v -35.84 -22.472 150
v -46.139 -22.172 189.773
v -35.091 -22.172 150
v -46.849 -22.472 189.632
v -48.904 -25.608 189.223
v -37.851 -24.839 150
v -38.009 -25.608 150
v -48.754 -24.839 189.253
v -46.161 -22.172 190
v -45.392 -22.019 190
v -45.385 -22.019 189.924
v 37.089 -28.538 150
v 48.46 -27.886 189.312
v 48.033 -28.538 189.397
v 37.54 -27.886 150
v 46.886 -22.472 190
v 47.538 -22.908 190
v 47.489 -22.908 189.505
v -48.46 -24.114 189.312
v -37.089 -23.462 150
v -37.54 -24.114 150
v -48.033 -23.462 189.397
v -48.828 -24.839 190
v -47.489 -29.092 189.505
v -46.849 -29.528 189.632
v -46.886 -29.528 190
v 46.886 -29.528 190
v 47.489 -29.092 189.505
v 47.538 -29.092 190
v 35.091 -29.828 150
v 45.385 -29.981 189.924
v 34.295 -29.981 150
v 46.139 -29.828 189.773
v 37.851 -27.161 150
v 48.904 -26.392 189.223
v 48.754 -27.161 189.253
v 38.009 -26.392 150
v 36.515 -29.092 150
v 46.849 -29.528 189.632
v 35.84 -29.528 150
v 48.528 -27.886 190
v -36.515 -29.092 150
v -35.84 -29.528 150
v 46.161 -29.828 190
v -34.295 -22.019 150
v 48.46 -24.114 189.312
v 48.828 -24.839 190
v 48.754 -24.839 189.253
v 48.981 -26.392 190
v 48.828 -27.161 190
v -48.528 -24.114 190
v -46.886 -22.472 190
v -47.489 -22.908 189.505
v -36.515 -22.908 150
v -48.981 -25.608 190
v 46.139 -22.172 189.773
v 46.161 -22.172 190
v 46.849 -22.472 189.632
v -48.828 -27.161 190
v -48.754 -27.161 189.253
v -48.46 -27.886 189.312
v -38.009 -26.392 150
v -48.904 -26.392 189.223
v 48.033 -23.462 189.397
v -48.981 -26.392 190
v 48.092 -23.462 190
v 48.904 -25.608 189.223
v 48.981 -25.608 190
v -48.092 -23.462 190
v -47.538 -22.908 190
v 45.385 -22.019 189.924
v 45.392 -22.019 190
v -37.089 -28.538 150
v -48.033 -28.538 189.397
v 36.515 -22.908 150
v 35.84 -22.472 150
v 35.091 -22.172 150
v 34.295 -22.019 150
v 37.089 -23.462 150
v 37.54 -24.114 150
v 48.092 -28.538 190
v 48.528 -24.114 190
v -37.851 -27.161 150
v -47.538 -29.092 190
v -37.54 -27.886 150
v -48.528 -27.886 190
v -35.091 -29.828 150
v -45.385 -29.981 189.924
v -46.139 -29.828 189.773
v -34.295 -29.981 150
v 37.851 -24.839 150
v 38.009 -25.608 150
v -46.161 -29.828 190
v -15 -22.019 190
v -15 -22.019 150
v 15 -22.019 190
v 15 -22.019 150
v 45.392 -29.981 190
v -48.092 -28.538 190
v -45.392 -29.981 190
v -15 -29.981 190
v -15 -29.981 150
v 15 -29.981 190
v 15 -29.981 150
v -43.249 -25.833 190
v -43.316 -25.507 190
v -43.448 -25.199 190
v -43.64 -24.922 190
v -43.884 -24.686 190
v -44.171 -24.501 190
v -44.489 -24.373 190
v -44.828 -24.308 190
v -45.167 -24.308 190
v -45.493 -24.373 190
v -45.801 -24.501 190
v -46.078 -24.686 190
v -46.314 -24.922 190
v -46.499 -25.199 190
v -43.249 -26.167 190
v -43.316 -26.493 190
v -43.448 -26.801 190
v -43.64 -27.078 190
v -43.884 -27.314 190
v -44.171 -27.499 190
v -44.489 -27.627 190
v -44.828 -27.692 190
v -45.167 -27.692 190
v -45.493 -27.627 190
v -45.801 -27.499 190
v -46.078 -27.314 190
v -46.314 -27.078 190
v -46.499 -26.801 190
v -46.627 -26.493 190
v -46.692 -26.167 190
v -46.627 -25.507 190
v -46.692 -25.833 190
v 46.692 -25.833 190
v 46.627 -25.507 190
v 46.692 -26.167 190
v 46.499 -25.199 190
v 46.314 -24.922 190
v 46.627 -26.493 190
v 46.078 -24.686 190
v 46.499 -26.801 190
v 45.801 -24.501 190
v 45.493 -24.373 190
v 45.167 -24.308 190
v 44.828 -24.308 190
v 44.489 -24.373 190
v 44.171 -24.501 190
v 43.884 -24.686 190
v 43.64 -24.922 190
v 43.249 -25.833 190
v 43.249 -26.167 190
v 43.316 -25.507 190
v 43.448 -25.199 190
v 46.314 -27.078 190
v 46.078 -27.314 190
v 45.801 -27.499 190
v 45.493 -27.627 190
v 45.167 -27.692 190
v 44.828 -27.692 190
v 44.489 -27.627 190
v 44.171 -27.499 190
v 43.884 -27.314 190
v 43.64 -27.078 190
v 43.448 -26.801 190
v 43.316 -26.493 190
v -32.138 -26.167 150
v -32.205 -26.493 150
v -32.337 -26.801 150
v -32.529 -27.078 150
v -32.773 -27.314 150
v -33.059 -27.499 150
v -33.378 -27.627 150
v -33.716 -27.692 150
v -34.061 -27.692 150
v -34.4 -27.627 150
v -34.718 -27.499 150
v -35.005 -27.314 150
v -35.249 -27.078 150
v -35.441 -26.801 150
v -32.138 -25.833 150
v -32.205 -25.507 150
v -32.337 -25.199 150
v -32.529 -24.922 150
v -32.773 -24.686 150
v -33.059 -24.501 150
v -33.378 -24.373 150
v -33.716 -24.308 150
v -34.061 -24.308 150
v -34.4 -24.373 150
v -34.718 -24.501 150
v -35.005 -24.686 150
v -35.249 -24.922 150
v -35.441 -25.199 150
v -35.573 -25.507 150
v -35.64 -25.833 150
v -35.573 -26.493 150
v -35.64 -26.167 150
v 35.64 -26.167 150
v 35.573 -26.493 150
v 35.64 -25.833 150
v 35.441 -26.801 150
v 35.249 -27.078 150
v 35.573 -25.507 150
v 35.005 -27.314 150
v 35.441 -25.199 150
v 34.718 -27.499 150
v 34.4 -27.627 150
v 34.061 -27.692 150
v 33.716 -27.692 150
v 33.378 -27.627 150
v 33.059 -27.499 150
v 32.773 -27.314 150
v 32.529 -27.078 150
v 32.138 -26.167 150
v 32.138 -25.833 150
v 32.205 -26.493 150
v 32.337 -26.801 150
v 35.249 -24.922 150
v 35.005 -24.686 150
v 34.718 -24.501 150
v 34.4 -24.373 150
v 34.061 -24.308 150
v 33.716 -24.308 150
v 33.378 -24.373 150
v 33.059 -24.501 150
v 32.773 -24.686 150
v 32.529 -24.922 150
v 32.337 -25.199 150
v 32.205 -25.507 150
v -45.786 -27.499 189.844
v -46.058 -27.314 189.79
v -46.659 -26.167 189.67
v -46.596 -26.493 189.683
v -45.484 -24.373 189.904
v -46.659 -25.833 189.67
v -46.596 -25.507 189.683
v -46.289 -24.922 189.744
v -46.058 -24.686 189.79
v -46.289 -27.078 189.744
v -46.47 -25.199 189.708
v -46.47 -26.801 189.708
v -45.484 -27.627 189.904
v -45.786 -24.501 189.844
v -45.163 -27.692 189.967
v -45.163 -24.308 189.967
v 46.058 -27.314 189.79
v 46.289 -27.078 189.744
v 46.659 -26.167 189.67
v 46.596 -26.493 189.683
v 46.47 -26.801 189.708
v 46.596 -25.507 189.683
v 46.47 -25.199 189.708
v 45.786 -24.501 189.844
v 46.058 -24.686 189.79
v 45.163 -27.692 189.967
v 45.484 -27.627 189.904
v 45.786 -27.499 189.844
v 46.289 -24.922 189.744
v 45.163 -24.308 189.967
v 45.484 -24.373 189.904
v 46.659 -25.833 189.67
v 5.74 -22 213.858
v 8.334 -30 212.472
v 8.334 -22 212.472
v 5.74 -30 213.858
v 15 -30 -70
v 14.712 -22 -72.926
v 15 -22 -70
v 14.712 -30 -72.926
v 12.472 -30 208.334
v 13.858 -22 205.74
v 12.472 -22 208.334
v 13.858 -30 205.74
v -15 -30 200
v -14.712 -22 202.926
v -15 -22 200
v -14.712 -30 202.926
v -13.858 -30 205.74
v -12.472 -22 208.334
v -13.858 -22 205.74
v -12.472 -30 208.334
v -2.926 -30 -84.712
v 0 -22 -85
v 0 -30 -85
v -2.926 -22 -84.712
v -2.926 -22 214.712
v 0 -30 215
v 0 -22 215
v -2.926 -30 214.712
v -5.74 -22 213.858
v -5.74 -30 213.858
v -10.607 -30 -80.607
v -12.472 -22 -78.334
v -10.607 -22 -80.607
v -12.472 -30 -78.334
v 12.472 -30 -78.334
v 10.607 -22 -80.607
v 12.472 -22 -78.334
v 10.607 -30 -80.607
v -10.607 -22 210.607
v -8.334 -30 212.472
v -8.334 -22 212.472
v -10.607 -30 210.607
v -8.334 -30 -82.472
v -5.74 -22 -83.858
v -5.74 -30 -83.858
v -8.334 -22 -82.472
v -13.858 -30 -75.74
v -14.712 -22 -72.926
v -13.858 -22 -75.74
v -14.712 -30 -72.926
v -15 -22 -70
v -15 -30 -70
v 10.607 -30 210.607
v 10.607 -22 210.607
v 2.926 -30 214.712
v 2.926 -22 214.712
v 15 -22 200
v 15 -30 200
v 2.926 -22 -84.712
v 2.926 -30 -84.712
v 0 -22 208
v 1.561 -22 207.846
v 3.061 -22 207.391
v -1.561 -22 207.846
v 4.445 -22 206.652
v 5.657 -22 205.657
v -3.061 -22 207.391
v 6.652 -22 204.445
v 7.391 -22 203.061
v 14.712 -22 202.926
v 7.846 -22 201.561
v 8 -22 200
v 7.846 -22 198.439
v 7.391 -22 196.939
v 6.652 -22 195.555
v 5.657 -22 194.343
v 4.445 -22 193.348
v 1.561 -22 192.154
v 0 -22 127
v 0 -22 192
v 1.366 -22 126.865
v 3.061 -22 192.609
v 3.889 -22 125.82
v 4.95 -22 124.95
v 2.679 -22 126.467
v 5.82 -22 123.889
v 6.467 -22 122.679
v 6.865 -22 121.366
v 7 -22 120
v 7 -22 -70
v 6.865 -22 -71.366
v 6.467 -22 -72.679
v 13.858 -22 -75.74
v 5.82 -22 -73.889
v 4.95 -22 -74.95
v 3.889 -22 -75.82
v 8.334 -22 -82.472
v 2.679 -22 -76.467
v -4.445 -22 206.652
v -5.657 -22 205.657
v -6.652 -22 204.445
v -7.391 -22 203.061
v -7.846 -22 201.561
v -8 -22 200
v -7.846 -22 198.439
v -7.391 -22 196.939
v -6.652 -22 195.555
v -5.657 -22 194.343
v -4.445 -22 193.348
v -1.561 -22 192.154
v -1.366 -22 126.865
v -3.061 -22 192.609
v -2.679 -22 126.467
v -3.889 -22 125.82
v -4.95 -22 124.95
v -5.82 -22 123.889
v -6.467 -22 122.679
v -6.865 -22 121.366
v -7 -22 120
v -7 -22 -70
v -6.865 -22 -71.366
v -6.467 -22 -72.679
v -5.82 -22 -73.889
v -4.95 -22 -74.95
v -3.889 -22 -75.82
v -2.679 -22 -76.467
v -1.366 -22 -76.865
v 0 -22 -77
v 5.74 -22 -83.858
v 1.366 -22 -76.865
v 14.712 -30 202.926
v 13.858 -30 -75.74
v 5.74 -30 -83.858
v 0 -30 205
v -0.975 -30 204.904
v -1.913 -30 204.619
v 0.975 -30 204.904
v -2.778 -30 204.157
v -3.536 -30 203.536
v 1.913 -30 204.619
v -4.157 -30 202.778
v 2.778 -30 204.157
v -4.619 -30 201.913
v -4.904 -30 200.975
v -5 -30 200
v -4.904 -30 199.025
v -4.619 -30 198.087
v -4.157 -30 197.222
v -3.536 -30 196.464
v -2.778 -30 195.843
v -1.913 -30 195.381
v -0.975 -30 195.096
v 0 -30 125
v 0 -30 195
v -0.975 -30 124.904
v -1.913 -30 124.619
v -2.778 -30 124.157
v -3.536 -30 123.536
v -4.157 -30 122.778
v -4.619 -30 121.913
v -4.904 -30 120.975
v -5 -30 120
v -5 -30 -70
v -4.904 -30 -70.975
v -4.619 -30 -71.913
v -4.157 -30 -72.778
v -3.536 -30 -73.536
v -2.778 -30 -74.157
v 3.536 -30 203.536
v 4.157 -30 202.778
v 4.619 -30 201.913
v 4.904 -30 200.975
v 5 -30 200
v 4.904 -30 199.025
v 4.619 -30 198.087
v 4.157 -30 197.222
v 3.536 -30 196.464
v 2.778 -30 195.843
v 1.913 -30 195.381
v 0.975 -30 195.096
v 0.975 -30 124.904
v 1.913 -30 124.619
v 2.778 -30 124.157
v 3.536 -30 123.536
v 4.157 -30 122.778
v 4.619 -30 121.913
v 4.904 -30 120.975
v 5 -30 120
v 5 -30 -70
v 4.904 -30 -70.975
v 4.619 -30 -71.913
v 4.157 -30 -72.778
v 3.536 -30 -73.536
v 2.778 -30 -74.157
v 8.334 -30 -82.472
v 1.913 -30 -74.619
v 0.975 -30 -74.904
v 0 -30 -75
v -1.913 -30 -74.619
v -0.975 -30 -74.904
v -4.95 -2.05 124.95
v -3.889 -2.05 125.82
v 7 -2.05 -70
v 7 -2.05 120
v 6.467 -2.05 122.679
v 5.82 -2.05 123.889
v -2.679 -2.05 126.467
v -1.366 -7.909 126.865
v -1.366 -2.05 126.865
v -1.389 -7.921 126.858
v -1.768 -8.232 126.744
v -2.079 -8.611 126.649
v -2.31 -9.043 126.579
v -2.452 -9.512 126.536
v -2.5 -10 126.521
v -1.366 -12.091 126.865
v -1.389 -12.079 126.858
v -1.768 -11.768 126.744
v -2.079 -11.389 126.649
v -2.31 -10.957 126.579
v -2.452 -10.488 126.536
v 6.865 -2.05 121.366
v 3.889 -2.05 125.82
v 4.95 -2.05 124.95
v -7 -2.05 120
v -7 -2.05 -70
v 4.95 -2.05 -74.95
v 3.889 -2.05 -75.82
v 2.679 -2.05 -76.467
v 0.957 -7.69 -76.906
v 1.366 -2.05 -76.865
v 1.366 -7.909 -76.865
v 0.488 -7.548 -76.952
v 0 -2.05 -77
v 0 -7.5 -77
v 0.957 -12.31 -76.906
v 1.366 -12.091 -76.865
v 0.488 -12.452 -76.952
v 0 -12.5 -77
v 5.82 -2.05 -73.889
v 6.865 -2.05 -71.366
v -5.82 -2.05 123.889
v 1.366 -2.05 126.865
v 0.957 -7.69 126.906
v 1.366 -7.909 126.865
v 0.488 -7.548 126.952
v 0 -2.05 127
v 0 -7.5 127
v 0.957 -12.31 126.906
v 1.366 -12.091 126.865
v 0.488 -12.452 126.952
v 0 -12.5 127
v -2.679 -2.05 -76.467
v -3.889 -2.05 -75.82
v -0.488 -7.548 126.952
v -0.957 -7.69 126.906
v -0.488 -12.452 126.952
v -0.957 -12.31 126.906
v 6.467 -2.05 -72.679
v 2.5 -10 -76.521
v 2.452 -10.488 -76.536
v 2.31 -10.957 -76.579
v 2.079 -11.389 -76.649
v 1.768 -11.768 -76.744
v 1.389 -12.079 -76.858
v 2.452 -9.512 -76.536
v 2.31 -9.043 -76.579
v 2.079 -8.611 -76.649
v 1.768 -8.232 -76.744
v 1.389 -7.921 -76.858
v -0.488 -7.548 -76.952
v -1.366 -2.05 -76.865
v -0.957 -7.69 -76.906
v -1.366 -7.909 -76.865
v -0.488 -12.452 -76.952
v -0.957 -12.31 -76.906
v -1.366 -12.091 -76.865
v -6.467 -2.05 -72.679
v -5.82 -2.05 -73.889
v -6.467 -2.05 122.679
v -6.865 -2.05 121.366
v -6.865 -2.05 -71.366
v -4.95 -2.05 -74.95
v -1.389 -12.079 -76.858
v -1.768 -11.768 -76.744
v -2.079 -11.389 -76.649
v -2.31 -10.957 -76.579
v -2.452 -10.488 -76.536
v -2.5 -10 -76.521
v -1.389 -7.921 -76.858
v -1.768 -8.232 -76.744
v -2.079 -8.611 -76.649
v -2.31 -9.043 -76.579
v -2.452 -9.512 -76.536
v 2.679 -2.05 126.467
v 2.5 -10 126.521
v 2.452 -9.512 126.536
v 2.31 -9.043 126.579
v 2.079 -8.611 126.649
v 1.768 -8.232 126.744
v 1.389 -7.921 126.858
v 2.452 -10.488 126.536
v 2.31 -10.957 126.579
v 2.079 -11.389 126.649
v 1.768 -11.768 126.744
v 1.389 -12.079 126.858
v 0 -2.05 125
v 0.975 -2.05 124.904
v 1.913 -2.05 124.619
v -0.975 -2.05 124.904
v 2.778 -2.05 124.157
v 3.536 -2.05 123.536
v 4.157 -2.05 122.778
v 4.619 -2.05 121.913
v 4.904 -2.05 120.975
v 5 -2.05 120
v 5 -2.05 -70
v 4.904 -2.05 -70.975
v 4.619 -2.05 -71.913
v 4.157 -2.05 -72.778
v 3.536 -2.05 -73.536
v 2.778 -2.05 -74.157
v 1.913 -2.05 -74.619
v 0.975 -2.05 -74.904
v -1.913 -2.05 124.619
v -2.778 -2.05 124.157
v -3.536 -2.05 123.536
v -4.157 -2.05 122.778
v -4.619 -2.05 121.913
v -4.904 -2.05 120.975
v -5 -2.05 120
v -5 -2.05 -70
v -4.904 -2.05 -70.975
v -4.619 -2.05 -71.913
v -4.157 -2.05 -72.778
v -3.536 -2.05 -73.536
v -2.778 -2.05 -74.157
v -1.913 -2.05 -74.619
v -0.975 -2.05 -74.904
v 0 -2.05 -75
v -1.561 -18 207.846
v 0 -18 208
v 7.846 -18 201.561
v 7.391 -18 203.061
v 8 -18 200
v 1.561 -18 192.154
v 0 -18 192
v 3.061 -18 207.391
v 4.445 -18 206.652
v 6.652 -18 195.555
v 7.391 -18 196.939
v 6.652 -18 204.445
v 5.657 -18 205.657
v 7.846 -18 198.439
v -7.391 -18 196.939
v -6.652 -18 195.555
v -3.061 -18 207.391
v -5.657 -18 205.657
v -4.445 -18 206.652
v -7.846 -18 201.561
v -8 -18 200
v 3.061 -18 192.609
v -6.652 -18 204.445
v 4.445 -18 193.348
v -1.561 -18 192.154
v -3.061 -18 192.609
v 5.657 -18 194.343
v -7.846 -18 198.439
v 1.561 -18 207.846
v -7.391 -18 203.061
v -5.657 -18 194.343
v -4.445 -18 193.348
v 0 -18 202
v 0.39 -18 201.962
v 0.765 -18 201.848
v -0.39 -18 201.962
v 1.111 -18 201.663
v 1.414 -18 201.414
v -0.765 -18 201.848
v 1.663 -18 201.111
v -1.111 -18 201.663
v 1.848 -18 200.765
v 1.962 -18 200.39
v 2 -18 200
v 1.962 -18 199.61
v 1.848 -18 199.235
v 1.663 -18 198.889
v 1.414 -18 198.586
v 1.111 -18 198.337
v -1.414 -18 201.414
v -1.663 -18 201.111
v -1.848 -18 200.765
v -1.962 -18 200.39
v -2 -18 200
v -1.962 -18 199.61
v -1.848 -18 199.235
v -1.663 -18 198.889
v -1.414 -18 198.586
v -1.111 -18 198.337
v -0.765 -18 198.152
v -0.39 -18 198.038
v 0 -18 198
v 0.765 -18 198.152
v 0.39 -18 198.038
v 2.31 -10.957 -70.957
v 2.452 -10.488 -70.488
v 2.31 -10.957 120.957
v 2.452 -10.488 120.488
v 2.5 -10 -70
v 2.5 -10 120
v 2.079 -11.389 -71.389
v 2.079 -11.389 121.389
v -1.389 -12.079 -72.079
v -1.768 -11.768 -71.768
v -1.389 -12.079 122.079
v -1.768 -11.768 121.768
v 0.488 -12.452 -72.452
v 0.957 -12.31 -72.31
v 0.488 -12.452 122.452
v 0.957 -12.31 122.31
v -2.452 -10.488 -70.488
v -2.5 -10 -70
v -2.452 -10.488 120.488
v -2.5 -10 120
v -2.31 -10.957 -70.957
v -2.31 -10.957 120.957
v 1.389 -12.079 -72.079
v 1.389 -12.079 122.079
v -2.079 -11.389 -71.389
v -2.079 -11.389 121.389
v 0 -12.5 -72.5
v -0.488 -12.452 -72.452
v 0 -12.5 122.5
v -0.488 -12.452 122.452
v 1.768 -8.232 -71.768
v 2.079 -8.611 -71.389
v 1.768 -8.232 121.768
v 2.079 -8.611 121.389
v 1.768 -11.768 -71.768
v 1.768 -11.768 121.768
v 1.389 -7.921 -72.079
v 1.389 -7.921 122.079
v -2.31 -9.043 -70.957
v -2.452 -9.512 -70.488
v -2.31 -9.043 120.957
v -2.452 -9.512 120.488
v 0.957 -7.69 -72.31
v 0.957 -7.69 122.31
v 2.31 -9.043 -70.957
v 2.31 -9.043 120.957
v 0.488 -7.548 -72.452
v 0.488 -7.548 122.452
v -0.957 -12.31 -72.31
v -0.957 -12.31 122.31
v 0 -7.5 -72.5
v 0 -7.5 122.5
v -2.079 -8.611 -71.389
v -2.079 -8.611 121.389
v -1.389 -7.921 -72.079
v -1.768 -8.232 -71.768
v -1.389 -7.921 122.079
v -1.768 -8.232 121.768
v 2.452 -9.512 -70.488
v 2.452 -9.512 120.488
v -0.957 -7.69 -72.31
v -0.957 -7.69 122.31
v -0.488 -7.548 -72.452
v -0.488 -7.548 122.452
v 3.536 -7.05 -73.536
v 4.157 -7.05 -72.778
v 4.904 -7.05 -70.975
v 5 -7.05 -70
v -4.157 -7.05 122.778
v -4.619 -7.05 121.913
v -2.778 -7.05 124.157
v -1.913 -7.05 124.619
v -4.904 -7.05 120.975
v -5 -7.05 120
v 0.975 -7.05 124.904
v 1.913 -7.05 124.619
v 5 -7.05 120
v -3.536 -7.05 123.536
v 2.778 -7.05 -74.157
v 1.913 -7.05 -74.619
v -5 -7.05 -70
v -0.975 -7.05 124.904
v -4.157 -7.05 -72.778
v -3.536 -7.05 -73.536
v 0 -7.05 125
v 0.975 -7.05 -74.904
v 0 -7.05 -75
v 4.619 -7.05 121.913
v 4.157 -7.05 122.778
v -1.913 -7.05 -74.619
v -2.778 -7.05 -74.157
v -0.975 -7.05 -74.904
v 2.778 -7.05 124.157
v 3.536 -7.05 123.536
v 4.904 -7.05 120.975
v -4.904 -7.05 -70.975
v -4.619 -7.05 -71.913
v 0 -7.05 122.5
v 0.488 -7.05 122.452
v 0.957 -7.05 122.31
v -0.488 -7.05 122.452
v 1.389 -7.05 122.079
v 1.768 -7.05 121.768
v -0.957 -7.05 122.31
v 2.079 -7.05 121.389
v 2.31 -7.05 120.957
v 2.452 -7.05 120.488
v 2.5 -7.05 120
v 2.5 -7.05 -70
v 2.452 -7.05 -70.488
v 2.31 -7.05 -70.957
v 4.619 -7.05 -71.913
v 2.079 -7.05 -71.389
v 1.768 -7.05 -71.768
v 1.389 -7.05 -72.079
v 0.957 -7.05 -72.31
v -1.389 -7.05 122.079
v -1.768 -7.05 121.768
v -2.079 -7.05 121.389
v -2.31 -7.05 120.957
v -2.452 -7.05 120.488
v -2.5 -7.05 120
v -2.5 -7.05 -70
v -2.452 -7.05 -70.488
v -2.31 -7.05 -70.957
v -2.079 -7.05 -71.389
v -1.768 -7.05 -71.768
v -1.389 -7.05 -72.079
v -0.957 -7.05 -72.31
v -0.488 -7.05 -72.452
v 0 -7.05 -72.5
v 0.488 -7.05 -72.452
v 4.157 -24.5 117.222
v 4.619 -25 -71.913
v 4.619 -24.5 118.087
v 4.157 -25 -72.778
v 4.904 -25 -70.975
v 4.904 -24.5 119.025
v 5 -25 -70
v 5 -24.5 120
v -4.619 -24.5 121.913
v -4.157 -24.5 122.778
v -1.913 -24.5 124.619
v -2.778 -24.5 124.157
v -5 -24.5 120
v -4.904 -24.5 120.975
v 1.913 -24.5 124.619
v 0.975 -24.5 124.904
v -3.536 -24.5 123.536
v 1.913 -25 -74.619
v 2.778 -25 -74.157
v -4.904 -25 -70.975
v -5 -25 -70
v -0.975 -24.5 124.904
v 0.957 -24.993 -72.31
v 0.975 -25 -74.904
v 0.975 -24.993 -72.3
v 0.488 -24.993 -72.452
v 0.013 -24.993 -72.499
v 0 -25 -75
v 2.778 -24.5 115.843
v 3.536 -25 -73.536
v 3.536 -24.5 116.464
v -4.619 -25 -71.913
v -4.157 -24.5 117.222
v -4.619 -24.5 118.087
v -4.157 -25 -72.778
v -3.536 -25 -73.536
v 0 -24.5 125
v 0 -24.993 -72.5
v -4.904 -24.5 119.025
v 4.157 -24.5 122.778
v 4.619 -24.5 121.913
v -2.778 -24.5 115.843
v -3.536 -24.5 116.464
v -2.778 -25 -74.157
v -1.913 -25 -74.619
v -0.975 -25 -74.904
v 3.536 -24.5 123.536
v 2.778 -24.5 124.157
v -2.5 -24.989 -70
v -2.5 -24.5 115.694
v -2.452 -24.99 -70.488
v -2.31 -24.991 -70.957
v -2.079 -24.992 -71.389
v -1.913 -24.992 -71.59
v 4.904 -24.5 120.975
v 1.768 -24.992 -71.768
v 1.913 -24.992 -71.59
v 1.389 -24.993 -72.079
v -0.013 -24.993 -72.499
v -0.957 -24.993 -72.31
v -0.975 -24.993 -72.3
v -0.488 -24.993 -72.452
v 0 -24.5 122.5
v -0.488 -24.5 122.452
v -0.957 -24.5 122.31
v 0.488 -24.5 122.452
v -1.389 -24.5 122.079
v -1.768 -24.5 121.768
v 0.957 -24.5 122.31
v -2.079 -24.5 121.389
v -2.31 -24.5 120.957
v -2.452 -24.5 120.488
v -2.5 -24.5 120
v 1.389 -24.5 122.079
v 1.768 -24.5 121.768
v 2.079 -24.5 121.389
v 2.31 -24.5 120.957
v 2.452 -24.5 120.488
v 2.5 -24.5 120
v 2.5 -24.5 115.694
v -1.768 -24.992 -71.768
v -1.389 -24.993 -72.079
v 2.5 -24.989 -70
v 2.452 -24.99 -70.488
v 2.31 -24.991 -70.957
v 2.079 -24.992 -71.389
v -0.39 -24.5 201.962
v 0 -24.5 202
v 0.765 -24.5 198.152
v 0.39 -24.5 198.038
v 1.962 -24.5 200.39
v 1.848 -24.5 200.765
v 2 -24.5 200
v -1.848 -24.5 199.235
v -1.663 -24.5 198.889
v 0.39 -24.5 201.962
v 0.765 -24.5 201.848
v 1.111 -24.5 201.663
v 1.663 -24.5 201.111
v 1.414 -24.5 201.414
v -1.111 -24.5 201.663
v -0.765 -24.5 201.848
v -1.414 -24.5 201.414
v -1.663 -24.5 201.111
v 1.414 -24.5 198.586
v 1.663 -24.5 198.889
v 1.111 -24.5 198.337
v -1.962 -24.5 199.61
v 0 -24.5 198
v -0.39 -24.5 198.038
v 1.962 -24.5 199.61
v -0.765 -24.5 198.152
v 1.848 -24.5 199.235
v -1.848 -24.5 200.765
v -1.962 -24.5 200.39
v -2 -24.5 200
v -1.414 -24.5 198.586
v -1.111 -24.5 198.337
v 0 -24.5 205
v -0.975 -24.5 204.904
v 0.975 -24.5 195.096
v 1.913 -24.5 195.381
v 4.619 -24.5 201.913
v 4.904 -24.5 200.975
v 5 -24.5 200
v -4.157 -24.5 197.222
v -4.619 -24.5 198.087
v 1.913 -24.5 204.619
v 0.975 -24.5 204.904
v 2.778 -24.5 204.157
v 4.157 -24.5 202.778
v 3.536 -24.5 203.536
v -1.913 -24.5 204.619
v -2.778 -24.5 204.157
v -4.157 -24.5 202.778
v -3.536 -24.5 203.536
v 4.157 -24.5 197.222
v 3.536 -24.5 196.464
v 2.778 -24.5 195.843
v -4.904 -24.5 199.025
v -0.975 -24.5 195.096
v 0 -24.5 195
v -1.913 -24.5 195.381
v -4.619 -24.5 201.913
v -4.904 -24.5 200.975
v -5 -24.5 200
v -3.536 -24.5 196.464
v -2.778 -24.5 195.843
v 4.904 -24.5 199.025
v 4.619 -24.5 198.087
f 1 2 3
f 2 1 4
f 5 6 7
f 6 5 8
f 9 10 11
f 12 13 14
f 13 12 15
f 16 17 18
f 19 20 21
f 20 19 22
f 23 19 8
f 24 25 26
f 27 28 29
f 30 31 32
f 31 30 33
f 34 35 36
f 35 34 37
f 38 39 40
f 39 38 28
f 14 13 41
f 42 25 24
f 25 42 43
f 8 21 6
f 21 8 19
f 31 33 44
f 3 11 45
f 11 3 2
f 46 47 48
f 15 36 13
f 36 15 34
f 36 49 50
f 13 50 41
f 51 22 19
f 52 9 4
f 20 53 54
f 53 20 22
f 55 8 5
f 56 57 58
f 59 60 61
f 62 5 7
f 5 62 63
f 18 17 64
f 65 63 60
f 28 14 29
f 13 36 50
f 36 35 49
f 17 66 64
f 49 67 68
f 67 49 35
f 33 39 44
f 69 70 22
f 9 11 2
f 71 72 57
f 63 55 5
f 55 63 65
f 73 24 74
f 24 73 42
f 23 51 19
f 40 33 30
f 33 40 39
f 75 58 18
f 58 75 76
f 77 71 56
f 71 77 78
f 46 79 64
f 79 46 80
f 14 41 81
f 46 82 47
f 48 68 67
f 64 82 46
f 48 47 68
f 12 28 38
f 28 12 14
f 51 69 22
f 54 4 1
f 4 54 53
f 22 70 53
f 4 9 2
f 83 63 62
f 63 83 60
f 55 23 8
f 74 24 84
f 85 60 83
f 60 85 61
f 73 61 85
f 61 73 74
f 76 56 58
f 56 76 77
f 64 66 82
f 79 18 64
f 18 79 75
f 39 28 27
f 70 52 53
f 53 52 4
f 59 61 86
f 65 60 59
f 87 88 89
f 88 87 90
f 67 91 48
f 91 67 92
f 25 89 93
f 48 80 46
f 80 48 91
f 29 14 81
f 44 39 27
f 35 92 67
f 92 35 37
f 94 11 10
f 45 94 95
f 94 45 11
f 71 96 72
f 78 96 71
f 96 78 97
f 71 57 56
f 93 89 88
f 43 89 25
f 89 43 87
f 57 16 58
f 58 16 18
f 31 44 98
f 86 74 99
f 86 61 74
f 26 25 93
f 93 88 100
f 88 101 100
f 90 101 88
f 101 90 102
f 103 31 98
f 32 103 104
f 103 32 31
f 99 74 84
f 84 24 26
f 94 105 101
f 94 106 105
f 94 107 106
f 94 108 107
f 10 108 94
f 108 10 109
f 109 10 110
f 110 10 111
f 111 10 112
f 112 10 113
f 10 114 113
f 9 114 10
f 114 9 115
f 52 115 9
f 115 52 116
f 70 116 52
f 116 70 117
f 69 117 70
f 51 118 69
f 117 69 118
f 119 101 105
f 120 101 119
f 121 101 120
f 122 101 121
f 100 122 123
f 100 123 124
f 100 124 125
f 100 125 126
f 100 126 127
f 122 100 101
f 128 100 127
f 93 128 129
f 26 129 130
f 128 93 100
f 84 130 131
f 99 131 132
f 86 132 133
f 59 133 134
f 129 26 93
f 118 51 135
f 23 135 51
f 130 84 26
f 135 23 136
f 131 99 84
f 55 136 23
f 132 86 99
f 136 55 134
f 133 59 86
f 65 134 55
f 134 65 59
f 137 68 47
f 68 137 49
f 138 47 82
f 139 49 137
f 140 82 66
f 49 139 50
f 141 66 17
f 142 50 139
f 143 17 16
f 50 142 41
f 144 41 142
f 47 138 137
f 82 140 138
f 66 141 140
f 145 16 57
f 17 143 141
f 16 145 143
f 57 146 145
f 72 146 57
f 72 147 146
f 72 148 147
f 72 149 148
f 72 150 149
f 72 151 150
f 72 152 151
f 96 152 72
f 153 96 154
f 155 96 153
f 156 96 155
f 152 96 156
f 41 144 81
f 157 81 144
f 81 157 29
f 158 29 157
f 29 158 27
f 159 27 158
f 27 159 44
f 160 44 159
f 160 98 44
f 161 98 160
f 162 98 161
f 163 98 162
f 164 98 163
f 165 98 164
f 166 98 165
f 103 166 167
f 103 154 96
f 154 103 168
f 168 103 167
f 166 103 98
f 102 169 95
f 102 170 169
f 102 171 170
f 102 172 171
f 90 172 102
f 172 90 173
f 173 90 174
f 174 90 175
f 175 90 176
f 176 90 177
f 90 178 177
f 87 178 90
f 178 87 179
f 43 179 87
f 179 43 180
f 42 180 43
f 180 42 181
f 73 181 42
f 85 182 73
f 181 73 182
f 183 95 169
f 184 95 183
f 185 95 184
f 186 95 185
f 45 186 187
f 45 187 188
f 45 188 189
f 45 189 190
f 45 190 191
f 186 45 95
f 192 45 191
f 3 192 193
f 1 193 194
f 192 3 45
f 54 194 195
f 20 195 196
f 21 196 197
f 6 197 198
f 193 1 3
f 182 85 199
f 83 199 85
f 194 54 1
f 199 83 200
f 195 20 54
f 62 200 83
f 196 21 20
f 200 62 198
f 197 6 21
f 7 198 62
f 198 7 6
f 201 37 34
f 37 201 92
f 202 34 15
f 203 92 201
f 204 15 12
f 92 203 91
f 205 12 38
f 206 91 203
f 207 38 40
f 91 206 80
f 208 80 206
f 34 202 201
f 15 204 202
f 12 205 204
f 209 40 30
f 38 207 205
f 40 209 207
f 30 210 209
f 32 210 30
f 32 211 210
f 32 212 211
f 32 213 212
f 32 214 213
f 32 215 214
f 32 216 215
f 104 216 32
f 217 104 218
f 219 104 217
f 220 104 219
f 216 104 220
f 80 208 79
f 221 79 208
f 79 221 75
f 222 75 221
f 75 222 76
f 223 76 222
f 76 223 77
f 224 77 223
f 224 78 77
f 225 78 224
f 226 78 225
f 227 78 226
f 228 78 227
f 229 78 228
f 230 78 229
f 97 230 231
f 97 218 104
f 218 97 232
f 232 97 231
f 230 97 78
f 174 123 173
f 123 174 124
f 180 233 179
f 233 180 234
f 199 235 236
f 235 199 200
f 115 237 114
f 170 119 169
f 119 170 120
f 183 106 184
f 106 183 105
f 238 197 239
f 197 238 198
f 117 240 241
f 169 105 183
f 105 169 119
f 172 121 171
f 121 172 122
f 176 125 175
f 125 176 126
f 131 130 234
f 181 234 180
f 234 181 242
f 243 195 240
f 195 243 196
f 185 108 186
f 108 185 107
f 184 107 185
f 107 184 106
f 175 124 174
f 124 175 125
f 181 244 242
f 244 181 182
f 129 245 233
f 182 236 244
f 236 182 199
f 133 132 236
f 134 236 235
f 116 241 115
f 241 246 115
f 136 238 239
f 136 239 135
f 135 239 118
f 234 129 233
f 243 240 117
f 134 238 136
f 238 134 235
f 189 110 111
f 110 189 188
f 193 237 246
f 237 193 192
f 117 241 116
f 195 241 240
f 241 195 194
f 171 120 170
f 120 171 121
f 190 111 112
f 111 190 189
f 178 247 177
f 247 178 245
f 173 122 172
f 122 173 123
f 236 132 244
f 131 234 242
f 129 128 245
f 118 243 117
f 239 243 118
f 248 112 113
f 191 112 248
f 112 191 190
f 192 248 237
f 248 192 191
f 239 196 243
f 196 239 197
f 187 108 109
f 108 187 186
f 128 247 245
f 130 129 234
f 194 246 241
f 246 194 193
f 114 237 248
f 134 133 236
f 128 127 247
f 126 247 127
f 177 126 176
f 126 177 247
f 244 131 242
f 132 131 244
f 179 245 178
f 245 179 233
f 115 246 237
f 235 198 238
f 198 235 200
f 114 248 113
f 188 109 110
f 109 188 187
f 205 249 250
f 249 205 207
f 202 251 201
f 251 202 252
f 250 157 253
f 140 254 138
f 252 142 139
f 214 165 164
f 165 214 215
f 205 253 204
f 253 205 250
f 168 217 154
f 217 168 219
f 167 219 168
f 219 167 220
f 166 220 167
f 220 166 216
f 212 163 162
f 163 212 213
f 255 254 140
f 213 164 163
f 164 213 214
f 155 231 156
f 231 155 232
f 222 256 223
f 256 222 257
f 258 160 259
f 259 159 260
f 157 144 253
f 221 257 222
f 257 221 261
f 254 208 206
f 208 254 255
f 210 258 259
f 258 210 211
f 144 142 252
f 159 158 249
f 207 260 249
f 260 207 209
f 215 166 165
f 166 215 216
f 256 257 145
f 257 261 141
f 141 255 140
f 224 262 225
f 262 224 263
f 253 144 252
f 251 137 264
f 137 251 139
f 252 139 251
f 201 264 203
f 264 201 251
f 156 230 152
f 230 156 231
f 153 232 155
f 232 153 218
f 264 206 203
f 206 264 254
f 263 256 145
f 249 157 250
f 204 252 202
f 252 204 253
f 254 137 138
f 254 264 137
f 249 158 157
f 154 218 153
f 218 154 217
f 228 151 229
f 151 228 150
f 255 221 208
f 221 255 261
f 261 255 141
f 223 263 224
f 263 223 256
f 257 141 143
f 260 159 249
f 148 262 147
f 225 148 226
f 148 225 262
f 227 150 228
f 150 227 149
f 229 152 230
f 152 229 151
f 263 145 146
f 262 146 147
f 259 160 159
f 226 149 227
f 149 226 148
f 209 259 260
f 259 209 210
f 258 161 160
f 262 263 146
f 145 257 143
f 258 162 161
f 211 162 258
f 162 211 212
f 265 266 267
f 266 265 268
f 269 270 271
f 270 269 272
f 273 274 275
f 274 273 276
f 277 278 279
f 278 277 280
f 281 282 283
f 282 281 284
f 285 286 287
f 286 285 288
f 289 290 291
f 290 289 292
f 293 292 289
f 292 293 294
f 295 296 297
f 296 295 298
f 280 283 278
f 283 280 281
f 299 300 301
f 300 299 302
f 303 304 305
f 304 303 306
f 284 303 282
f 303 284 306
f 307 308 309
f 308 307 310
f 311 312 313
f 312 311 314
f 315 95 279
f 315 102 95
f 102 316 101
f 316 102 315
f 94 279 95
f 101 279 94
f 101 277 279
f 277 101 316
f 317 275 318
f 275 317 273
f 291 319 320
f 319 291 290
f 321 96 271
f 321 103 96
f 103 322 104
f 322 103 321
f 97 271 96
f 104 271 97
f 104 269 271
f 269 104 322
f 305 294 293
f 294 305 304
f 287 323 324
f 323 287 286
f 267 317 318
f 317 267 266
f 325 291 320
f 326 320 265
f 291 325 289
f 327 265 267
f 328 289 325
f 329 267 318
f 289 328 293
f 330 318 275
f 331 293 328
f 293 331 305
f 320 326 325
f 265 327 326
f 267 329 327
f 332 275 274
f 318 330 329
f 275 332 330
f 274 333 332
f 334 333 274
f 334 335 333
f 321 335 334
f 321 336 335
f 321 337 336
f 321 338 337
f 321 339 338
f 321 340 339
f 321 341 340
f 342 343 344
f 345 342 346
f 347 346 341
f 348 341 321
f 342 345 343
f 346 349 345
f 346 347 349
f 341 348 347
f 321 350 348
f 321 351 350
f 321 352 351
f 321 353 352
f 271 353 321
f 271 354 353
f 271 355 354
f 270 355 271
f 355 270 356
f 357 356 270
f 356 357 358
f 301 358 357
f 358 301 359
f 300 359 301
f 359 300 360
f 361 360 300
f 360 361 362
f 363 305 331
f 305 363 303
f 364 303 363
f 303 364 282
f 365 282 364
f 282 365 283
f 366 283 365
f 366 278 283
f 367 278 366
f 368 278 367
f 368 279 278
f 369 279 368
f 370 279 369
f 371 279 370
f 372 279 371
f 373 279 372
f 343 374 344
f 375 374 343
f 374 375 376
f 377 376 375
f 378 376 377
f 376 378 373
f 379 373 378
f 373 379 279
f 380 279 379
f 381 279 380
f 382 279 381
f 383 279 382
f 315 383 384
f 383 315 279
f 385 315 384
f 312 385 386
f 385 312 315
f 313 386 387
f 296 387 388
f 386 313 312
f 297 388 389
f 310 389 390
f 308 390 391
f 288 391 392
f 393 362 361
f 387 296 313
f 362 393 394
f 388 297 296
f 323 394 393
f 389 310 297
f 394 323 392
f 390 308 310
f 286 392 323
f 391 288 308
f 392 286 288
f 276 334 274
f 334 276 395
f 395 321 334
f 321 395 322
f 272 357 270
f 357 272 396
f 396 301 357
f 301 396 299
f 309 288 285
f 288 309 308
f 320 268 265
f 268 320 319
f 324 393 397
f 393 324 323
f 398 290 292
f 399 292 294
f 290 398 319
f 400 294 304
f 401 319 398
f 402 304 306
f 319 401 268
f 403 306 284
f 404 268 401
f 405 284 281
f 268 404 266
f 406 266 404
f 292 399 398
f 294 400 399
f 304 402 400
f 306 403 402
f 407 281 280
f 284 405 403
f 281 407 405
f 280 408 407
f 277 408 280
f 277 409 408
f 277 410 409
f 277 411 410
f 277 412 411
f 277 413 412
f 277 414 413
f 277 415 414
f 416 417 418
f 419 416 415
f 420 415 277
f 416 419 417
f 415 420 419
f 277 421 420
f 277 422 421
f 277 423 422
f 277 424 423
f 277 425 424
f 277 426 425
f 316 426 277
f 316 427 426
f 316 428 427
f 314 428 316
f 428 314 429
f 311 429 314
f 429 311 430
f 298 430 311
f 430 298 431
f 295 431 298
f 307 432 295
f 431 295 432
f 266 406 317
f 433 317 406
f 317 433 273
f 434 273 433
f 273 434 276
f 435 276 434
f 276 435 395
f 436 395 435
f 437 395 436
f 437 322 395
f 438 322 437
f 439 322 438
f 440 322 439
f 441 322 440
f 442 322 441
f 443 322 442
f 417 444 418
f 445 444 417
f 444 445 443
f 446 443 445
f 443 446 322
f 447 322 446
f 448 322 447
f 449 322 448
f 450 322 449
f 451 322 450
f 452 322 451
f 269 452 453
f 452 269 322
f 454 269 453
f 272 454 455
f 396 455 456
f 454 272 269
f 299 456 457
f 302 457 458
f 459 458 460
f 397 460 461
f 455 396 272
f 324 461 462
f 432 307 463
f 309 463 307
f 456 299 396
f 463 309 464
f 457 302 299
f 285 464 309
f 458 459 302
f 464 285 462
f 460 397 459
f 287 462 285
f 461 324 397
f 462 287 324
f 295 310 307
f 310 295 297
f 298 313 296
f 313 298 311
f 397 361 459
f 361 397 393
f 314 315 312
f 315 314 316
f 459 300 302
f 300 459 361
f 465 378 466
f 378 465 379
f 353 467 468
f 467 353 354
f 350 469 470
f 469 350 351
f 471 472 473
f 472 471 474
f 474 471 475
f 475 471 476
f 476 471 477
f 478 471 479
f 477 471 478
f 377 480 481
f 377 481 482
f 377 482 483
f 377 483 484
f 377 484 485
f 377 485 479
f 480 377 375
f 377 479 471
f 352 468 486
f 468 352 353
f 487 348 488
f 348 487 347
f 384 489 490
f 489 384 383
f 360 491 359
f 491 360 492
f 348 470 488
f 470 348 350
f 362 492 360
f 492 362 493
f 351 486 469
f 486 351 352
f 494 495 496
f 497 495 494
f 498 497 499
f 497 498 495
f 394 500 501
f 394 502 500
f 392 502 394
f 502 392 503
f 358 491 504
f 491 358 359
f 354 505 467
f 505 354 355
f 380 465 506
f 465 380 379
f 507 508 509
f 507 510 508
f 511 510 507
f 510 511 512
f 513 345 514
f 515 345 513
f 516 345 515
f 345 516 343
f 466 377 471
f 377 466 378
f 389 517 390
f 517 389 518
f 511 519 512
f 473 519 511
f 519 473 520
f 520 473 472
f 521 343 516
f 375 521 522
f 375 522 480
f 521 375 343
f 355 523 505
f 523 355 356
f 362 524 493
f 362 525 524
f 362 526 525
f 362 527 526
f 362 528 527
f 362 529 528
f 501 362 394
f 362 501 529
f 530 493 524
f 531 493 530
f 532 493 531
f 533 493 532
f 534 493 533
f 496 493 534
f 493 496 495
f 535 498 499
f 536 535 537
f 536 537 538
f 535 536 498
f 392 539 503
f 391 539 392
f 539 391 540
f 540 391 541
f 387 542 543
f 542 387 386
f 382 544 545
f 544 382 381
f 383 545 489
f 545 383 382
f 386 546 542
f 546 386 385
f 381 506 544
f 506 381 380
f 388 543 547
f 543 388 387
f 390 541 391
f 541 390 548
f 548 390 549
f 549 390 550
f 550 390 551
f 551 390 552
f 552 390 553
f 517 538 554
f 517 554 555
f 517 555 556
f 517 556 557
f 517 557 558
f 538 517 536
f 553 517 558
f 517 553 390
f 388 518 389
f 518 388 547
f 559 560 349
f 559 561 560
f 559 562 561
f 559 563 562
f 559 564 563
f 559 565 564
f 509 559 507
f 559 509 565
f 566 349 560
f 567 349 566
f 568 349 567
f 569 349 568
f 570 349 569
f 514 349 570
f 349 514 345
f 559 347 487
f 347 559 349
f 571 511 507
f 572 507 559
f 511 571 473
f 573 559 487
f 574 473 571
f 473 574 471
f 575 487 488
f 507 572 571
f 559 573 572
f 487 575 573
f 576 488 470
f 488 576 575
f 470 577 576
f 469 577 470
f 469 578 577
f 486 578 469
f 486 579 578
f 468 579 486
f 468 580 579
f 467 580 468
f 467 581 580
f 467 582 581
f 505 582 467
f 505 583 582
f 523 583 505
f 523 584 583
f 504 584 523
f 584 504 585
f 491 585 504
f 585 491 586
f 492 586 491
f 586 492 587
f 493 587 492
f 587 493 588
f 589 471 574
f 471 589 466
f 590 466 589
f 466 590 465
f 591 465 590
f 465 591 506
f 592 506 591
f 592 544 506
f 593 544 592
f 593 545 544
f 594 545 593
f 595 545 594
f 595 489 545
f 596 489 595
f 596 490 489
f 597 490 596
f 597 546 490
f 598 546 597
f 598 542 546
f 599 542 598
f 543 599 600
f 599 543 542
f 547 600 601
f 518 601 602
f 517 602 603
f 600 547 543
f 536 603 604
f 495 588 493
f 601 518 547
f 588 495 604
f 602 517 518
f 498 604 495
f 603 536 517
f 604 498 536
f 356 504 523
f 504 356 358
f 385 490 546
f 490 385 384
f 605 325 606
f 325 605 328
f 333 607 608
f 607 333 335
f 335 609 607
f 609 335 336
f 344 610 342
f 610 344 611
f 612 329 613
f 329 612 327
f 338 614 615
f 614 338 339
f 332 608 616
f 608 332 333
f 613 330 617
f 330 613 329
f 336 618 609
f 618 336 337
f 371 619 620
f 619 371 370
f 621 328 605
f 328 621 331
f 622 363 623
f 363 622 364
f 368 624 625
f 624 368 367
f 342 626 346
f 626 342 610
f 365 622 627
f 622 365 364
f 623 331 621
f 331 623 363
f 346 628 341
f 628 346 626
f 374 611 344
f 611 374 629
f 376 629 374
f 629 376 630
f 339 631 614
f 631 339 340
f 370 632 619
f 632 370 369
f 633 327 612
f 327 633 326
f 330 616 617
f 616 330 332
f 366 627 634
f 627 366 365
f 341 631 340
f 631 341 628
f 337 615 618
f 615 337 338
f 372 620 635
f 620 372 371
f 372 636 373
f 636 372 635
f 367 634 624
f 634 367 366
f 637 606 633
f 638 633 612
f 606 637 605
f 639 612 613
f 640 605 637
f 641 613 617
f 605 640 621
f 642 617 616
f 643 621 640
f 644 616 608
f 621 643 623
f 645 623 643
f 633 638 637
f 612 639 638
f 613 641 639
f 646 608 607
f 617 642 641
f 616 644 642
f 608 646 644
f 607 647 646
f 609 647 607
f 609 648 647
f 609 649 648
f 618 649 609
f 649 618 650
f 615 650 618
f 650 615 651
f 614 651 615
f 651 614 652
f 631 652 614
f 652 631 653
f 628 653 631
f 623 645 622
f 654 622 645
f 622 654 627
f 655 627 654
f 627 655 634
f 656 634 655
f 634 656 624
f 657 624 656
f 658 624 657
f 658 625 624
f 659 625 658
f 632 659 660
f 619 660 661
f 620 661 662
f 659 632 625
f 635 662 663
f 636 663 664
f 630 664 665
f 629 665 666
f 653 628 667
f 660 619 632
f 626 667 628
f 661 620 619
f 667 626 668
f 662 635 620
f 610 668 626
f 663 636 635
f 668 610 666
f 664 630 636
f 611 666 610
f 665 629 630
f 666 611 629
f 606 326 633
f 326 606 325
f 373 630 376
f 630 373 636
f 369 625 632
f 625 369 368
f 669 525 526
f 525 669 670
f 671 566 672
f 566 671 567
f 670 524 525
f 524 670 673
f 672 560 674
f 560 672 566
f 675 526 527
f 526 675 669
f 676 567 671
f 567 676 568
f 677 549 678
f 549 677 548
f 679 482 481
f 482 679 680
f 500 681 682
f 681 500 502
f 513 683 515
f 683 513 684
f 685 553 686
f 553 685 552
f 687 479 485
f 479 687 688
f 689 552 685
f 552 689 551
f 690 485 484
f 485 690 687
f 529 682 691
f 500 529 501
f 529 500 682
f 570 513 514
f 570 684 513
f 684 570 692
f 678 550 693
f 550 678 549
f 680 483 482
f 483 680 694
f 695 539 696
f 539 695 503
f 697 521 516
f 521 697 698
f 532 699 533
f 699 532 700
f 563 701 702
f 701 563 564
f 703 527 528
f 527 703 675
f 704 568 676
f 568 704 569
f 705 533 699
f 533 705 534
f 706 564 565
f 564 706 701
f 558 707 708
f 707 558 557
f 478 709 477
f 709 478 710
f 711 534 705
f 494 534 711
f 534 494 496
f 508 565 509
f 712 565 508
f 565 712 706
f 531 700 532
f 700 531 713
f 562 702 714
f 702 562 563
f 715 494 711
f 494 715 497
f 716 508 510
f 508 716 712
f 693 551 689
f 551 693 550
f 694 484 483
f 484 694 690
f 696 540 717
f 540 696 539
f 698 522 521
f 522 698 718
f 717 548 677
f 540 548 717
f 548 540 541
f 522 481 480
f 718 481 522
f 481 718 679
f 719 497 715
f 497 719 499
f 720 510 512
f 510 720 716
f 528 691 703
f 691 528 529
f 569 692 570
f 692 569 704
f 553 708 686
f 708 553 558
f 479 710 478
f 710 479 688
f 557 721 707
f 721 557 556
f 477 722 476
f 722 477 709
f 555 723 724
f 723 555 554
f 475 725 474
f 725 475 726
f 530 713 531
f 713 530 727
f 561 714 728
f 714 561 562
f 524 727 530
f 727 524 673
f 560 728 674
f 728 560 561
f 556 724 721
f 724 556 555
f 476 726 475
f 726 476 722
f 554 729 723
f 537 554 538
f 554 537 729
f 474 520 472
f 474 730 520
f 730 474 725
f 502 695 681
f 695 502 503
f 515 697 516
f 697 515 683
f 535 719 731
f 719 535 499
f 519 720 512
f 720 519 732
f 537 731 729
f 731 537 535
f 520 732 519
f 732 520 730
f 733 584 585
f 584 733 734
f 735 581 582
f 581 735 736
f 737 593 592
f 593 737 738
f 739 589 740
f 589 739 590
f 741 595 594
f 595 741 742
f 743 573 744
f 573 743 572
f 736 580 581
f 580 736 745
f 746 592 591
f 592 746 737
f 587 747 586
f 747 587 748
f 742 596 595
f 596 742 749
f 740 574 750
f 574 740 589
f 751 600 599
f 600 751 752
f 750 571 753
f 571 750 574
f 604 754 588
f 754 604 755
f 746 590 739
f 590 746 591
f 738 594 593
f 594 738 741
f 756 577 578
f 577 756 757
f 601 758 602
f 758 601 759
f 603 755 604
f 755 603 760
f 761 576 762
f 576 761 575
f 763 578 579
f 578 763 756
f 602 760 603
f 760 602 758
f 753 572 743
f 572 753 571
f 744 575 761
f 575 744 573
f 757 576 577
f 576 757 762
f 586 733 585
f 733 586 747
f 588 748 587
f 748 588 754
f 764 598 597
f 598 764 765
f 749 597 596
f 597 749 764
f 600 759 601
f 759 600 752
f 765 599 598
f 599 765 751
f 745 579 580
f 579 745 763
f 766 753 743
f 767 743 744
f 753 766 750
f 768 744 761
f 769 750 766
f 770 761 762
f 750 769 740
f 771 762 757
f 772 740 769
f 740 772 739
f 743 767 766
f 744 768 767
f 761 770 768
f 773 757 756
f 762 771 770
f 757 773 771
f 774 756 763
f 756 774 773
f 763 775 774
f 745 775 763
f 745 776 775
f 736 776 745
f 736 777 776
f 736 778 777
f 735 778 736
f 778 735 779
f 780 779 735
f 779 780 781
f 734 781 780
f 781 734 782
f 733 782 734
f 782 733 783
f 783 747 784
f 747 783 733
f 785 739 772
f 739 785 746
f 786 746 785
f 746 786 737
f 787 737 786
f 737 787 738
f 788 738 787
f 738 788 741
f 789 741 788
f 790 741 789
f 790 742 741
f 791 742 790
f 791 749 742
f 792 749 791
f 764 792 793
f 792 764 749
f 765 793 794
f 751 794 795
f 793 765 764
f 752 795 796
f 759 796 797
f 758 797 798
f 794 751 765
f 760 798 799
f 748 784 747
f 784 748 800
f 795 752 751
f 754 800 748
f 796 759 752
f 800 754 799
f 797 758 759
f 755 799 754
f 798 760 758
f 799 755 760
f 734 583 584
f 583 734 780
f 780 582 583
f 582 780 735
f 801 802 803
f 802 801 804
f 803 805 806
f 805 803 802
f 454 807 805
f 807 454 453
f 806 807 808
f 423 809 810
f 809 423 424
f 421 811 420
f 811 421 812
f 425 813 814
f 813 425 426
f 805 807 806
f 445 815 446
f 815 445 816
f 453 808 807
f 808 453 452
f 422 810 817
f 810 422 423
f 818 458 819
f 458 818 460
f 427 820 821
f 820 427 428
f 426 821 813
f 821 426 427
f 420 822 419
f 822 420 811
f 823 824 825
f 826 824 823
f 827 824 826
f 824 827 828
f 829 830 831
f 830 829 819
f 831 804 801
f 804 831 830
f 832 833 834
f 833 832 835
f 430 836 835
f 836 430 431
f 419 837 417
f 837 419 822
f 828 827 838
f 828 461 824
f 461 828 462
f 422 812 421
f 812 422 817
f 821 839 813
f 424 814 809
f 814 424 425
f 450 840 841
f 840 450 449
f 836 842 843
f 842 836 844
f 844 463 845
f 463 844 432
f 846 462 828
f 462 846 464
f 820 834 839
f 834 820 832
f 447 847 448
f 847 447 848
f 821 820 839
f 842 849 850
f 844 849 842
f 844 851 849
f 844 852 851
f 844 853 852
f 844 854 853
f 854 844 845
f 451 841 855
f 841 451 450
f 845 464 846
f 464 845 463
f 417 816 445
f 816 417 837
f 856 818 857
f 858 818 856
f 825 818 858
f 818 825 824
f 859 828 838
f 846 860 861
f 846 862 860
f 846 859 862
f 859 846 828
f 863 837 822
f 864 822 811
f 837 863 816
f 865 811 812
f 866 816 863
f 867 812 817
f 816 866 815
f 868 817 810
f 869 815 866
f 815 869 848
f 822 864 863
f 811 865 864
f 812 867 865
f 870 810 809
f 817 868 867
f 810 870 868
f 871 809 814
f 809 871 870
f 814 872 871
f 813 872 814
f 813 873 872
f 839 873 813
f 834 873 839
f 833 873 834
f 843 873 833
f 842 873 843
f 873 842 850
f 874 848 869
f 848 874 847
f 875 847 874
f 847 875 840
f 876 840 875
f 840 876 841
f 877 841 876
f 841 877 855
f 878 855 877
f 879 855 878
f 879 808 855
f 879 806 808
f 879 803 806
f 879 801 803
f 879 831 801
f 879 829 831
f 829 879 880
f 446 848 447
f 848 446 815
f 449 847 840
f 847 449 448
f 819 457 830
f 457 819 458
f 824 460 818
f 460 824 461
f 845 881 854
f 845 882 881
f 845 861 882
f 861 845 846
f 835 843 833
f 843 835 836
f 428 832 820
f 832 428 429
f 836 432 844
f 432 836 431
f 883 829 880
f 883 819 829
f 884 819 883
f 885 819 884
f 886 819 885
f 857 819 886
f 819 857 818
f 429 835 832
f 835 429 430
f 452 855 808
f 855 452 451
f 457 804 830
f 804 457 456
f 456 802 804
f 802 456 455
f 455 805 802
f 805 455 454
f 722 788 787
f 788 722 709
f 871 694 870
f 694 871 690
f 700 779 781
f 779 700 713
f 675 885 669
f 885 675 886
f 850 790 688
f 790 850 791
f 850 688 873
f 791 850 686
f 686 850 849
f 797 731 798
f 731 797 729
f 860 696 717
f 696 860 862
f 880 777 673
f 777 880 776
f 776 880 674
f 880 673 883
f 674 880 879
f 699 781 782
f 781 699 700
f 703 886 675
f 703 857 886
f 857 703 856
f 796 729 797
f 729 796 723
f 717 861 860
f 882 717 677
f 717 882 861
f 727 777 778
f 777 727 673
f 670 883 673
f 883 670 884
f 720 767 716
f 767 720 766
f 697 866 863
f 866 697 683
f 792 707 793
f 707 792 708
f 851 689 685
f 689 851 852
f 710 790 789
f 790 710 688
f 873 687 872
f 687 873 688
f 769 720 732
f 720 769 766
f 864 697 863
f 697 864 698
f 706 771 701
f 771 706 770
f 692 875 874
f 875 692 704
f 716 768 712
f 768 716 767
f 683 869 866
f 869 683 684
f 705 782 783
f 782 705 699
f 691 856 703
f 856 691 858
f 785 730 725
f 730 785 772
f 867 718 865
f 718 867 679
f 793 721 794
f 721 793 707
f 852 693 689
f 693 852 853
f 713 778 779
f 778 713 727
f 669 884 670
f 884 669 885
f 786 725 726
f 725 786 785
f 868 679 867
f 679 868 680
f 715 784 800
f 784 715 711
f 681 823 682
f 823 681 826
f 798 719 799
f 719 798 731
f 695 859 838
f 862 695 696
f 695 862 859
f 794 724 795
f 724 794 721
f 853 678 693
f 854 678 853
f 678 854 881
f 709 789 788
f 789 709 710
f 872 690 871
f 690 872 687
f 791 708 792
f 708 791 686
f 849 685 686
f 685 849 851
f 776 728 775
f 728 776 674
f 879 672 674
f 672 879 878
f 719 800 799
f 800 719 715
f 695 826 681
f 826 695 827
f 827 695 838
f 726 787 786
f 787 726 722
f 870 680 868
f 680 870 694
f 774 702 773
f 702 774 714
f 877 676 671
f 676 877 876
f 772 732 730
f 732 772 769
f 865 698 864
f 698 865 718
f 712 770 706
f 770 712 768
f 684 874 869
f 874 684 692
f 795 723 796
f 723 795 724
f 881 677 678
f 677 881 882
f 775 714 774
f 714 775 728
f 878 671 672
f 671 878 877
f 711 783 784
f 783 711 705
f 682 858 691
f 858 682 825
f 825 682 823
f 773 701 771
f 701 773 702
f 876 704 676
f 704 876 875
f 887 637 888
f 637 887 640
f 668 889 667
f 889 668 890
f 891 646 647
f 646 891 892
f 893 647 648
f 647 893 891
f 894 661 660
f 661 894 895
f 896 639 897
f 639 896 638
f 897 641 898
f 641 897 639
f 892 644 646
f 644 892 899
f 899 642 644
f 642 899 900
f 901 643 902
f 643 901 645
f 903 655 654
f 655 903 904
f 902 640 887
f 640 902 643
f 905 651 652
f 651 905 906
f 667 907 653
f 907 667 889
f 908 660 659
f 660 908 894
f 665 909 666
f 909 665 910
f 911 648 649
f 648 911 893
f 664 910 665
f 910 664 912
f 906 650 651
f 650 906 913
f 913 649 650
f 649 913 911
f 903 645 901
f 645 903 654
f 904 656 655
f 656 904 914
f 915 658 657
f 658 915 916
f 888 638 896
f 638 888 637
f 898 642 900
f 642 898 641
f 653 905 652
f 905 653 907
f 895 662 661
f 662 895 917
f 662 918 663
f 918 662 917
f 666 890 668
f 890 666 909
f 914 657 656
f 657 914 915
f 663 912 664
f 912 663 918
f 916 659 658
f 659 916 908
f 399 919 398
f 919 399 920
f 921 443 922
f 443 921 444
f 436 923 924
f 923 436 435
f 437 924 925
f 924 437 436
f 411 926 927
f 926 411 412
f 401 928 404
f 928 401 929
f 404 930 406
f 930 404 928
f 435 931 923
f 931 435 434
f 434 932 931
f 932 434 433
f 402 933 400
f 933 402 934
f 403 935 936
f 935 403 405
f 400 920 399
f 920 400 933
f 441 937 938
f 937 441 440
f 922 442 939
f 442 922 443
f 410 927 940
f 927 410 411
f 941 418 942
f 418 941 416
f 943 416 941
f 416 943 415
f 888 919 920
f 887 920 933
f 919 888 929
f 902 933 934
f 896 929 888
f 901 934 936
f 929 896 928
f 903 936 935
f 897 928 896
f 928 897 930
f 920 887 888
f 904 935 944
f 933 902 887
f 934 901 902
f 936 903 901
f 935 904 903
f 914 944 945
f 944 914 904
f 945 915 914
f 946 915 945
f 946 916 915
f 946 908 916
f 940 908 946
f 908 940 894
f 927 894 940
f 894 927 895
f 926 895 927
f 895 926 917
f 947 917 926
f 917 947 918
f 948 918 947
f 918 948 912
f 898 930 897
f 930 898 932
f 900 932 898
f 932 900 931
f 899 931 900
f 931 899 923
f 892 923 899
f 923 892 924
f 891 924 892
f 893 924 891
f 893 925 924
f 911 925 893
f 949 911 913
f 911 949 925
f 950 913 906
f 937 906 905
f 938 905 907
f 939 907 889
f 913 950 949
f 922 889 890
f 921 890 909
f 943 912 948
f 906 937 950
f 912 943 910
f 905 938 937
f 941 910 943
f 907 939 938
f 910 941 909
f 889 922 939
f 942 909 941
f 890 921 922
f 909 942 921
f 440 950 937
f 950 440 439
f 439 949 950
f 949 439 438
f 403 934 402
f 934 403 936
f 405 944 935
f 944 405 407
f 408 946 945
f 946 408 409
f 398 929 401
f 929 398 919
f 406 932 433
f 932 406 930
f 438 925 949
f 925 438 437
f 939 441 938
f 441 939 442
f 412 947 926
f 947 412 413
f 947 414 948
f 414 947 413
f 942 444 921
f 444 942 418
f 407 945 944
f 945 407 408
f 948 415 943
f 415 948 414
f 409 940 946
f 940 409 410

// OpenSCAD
pr=6.5;
ph=535;
spd=80;
sph=400;
lph=210;

td=15.950;

renderarm=true;

$fn=32;


startA=10;
endA=73;
range=endA-startA;

// p=sin(360*$t)/2+0.5;

p=0.5;
a=range*p+startA;



tr=15;

zoffset = cos(a)*ph-sph;

// if(renderarm) {
// translate([0,0,-zoffset/2]) {
//   armature();
//   mirror([1,0,0]) armature();
// }
// }

translate([0,-30,-70]) armRig();

module armRig() {
  ah=270;
  sl=ah-80;
  mirror([0,1,0]) difference() {
    union() {
      hull() {
        rotate([90,0,0]) cylinder(r=tr,h=8);
        translate([0,0,ah]) rotate([90,0,0]) cylinder(r=tr,h=8);
      }
      hull() {
        rotate([90,0,0]) cylinder(r=7,h=12+td);
        translate([0,0,sl]) rotate([90,0,0]) cylinder(r=7,h=12+td);
      }
      translate([0,0,ah]) rotate([90,0,0]) cylinder(r=8,h=12);

      translate([0,-4,170]) rotate([0,-90,0]) rotate([90,0,0]) {
        difference() {
          intersection () {
            hull() {
              armBarPath(4);
              mirror([0,1,0]) armBarPath(4);  
            }
            translate([50,-50,-10]) cube([40,100,20]);
          }
          armBarPath(1.7);
          mirror([0,1,0]) armBarPath(1.7);
      }
      }
    }
      translate([0,-20,-50]) cylinder(r=2.5,h=300);

    translate([0, -12-td+5,0]) hull() {
      rotate([90,0,0]) cylinder(r=5,h=5.1);
      translate([0,0,sl]) rotate([90,0,0]) cylinder(r=5,h=5.6);
    }

    translate([0,0.1,0]) hull() {
      rotate([90,0,0]) cylinder(r=5,h=5.1);
      translate([0,0,sl]) rotate([90,0,0]) cylinder(r=5,h=5.6);
    }

    hull() {
      translate([0,1,0]) rotate([90,0,0]) cylinder(r=2.5,h=32);
      translate([0,1,sl]) rotate([90,0,0]) cylinder(r=2.5,h=32);
    }

    translate([0,1,ah]) rotate([90,0,0]) cylinder(r=2,h=70);
    translate([0,0.1,ah]) rotate([90,0,0]) cylinder(r=5,h=5.6);

  }
}





module armature() {
  translate([10,0,0]) rotate([0,a,0]) {
    pole();
    translate([0,0,ph]) rotate([0,180-a*2,0]) {
      pole();
      translate([0,0,spd]) rotate([0,a*2,0]) {
         pole(sph);
         translate([0,-13,sph]) rotate([0,180-a*2,0]) pole(lph);
      }
    }
  }
}

module pole(h=ph) {
  cylinder(r=pr,h=h);
}

module armBarPath(r) {
  hull() {
    translate([0,20,0]) sphere(r=r);
    translate([90,45,0]) sphere(r=r);
  }
}
